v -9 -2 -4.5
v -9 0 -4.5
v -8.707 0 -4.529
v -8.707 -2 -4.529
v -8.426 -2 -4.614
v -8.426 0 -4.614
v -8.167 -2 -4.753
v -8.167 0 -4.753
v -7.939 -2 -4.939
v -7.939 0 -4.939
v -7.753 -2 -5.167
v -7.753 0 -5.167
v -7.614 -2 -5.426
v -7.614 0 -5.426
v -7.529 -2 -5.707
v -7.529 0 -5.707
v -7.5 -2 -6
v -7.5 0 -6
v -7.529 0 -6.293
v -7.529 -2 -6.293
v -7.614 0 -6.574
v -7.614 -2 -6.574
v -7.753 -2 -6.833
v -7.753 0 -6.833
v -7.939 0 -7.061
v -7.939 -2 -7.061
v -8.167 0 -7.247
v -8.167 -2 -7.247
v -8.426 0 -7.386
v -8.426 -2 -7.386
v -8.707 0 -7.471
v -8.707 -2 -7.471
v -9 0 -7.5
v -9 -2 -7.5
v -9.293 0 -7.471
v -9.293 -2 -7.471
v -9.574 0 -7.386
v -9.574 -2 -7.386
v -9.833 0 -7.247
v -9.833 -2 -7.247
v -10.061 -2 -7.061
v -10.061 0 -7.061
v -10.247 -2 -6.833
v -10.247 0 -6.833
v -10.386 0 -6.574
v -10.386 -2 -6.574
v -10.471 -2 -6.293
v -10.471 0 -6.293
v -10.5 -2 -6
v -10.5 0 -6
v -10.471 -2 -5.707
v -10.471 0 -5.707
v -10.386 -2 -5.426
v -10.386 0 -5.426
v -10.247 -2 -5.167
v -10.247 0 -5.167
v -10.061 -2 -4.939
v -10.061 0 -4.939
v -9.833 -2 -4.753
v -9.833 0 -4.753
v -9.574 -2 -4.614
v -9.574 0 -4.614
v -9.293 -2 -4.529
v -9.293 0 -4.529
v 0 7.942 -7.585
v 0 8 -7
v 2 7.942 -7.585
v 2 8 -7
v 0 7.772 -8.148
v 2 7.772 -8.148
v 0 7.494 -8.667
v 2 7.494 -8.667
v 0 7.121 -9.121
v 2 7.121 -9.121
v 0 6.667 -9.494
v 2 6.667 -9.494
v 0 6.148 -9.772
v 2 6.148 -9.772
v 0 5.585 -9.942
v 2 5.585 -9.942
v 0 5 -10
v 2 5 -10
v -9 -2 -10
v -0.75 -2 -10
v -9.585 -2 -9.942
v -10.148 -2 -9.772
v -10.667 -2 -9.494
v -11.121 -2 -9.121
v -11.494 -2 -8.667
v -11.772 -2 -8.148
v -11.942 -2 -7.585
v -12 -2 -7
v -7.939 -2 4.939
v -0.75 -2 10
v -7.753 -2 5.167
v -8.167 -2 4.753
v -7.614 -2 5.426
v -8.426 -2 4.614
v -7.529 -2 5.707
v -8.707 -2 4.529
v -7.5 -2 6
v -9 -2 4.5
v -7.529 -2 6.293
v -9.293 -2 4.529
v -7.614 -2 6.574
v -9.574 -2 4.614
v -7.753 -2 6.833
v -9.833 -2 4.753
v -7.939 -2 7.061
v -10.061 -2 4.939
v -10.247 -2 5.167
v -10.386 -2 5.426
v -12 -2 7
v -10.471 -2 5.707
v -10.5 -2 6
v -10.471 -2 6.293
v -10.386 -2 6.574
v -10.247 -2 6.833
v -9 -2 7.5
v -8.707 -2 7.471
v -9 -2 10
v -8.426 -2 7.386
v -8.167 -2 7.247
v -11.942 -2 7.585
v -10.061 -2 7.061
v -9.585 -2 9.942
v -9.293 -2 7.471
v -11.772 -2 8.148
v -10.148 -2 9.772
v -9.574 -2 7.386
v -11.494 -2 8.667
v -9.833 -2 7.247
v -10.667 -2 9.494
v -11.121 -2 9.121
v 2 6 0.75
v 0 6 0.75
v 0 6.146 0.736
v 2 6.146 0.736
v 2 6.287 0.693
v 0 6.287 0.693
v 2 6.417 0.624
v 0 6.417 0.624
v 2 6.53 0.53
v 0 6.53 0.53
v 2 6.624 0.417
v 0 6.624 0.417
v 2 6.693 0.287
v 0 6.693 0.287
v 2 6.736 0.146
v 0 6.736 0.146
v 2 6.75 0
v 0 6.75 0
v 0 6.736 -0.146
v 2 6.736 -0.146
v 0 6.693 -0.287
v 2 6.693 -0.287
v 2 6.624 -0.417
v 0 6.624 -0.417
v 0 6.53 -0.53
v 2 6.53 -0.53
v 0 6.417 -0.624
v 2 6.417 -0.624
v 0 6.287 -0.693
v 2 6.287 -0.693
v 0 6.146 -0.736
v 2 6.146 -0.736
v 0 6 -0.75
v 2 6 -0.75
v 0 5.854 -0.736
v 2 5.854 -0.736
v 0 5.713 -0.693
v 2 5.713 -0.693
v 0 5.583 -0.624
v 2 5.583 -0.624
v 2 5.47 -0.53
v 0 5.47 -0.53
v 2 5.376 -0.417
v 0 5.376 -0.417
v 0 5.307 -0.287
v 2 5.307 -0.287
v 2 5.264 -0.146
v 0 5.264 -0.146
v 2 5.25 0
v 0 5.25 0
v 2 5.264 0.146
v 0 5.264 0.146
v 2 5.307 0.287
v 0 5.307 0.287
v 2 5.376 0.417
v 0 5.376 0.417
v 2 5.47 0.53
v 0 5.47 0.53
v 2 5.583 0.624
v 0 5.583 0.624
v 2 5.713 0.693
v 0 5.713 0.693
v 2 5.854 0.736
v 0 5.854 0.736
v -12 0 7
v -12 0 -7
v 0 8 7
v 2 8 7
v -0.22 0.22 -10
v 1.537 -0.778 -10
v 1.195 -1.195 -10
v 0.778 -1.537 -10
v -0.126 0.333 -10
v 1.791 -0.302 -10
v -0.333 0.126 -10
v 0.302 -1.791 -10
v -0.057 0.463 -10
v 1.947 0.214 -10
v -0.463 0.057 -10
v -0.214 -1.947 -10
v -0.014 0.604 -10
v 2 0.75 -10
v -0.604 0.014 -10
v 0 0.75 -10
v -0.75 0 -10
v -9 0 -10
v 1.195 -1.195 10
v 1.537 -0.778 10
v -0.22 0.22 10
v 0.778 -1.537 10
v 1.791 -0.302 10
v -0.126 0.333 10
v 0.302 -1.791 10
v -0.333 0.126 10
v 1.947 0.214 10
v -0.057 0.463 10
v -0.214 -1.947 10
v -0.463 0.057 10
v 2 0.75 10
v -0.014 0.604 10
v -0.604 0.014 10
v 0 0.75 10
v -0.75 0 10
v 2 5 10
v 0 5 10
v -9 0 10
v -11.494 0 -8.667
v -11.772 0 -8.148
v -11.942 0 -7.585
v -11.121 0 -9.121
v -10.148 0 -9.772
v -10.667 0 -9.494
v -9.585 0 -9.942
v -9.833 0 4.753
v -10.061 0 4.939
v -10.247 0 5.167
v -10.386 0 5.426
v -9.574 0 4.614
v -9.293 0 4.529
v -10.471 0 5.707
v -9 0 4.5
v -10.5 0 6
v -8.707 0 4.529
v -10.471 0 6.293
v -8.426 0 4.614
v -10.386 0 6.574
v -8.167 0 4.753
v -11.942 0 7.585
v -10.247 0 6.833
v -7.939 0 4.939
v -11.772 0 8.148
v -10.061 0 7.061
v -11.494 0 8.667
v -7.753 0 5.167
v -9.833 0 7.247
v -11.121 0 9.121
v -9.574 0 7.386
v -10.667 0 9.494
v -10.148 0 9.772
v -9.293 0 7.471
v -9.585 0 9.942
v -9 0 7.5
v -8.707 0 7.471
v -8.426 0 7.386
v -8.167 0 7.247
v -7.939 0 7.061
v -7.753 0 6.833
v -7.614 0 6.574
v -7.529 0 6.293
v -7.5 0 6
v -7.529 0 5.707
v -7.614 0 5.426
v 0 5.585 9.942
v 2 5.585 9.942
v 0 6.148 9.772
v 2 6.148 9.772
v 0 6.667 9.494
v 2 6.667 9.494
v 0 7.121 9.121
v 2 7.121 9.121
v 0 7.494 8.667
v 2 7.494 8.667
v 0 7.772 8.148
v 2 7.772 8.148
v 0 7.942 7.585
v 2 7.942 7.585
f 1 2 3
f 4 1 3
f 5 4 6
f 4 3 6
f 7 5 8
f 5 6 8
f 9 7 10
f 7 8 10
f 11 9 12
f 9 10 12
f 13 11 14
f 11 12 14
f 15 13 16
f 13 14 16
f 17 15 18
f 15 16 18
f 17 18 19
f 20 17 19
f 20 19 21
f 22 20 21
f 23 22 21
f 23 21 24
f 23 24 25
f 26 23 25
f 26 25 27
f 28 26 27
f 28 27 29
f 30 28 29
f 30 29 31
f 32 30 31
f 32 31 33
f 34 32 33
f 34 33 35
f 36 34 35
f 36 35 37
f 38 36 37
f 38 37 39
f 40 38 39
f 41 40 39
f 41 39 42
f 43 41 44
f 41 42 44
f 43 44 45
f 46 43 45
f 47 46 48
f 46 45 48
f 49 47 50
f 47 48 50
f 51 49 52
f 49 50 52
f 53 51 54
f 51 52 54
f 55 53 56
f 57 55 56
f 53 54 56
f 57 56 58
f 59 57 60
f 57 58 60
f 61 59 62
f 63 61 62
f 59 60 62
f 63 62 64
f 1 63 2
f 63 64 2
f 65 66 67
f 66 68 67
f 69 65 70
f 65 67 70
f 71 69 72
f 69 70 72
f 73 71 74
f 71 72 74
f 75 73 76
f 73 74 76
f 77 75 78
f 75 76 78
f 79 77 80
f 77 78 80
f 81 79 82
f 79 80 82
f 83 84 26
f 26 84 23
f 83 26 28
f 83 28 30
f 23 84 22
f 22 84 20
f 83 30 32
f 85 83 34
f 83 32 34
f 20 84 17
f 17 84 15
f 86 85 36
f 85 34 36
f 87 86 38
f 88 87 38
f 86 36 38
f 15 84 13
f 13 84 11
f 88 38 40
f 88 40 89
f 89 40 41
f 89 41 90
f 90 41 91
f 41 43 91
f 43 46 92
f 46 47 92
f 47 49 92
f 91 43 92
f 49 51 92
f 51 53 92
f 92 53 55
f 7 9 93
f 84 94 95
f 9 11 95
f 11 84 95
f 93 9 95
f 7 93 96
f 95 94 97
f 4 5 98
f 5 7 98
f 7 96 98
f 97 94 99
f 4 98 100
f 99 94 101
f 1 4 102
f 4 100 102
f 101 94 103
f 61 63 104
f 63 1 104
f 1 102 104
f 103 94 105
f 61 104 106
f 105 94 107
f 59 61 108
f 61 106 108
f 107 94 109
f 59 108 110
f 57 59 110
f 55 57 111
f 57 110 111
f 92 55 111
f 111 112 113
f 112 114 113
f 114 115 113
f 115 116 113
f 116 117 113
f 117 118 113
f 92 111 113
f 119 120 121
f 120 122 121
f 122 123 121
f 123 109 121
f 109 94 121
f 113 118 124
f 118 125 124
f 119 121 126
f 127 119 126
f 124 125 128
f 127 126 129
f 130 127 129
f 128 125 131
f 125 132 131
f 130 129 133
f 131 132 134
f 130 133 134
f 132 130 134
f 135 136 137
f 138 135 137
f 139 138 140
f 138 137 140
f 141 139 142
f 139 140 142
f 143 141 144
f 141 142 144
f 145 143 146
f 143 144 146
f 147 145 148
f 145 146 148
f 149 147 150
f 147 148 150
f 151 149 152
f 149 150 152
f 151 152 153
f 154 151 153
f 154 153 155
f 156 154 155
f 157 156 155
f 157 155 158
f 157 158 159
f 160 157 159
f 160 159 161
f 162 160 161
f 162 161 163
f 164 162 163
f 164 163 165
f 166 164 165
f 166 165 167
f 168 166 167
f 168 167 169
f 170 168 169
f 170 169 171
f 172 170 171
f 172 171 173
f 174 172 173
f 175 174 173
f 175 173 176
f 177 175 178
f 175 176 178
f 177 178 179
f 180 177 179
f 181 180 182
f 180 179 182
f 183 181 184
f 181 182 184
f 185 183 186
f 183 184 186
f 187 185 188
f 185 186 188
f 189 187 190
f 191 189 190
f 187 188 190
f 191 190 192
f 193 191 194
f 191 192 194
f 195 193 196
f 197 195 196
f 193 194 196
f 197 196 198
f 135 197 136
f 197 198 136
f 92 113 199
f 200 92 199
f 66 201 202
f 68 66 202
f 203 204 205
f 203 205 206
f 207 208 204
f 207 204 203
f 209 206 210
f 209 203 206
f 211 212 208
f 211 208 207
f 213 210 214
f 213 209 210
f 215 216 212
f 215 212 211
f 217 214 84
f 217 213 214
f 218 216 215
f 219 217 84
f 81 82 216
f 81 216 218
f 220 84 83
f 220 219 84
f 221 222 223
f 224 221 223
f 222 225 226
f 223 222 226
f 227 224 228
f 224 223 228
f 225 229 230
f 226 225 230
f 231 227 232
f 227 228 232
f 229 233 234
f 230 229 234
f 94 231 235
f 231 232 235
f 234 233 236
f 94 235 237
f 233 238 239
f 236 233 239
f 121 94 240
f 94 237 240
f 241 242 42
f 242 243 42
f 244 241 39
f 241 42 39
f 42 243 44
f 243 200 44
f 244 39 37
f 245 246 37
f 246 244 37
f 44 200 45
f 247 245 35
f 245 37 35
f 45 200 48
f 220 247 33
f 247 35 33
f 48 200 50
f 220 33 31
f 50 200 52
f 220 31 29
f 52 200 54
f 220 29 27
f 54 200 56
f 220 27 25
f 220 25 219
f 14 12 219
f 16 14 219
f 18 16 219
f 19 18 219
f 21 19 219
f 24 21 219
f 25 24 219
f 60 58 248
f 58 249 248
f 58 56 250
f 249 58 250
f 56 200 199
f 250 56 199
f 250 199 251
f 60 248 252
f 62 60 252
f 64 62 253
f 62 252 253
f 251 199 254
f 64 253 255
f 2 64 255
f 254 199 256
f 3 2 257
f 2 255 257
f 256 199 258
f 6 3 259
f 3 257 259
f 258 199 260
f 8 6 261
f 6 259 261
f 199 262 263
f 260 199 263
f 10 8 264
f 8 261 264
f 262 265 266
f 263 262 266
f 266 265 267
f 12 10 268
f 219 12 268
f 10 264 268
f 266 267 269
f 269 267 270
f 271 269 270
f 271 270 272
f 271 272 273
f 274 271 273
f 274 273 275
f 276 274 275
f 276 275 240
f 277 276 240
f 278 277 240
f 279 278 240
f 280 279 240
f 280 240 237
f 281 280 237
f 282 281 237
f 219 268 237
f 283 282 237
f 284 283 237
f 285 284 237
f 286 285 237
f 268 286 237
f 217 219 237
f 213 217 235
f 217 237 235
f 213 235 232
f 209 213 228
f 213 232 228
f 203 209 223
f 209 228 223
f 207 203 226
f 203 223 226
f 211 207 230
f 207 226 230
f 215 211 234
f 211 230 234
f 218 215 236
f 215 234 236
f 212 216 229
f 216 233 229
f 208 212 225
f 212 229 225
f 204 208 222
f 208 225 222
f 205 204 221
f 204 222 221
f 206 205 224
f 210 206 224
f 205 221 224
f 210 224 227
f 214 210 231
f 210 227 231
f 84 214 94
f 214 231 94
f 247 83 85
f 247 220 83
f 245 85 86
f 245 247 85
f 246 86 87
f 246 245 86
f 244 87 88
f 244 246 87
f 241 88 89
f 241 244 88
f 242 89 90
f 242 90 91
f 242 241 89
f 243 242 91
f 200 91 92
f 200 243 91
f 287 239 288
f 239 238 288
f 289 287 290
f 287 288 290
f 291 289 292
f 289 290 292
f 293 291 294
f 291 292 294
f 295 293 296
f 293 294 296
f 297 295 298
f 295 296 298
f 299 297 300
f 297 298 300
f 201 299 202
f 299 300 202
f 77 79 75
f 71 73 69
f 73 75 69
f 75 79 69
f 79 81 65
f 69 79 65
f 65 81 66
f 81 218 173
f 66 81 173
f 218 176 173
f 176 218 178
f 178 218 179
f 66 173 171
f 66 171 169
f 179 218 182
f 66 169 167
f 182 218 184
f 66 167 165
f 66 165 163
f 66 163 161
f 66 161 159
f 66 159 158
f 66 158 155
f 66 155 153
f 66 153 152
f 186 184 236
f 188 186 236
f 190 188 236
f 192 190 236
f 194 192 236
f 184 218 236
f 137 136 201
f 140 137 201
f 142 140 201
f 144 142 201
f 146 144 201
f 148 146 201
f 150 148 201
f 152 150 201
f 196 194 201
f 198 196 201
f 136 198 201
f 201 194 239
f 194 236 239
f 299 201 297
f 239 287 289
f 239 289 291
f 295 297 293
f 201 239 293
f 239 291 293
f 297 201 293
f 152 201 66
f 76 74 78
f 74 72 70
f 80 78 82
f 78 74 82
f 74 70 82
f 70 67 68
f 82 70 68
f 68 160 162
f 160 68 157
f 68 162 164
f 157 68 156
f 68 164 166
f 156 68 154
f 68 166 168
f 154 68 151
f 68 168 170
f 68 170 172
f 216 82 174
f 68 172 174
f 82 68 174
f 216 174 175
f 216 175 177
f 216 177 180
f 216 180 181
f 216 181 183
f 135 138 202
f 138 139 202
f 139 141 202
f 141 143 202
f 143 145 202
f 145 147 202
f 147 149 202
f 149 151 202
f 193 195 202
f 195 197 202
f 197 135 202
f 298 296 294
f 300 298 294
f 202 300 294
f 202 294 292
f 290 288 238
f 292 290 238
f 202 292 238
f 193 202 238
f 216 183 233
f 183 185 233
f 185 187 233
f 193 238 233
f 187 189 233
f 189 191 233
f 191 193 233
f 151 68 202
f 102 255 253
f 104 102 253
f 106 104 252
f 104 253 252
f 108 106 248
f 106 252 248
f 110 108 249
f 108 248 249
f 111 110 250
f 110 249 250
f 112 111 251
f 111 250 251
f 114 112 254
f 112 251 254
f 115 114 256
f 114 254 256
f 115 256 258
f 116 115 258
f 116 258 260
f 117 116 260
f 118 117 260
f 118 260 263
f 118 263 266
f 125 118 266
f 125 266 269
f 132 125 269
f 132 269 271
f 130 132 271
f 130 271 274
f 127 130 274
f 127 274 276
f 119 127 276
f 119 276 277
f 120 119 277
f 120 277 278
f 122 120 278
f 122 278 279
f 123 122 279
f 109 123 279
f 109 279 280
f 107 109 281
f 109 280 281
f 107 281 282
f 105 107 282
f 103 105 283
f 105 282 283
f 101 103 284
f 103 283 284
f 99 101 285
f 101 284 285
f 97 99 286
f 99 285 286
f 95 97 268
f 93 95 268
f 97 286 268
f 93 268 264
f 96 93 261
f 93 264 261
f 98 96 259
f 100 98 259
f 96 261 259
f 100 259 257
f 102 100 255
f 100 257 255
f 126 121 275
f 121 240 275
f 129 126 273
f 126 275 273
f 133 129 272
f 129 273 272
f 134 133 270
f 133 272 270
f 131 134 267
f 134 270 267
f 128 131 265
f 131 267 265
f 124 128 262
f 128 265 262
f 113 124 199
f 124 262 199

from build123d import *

# Parameters (mm, degrees)
BASE_FLANGE1_DEPTH = 10
FILLET1_R          = 3
SKETCH6_R          = 1.5
CUT_EXTRUDE1_DEPTH = 18.549928775
SKETCH7_R          = 0.75
CUT_EXTRUDE2_DEPTH = 18.549928775


# Sheet-metal steps are written as plain solids
with BuildPart() as part:
    # Sketch1 → Base-Flange1 (new, symmetric)
    with BuildSketch(Plane.XY):
        with BuildLine():
            Line((-12, 0), (-0.75, 0))
            ThreePointArc((-0.75, 0), (-0.219669914, 0.219669914), (0, 0.75))
            Line((0, 0.75), (0, 8))
            Line((0, 8), (2, 8))
            Line((2, 8), (2, 0.75))
            ThreePointArc((2, 0.75), (1.194543648, -1.194543648), (-0.75, -2))
            Line((-0.75, -2), (-12, -2))
            Line((-12, -2), (-12, 0))
        make_face()
    extrude(amount=BASE_FLANGE1_DEPTH, both=True)

    # Fillet1
    fillet1_edges = [part.edges().sort_by_distance(p)[0] for p in [
        (-12, -1, 10),
        (-12, -1, -10),
        (1, 8, 10),
        (1, 8, -10),
    ]]
    fillet(fillet1_edges, radius=FILLET1_R)

    # Sketch6 → Cut-Extrude1 (cut, through all)
    with BuildSketch(Plane(origin=(0, 0, 0), x_dir=(1, 0, 0), z_dir=(0, 1, 0))):
        with Locations(Location((-9, 6, 0), (0, 0, 270))):
            Circle(SKETCH6_R)
        with Locations(Location((-9, -6, 0), (0, 0, 90))):
            Circle(SKETCH6_R)
    extrude(amount=-CUT_EXTRUDE1_DEPTH, mode=Mode.SUBTRACT)

    # Sketch7 → Cut-Extrude2 (cut, through all)
    with BuildSketch(Plane.ZY):
        with Locations((0, 6)):
            Circle(SKETCH7_R)
    extrude(amount=-CUT_EXTRUDE2_DEPTH, mode=Mode.SUBTRACT)


solid = part.part
